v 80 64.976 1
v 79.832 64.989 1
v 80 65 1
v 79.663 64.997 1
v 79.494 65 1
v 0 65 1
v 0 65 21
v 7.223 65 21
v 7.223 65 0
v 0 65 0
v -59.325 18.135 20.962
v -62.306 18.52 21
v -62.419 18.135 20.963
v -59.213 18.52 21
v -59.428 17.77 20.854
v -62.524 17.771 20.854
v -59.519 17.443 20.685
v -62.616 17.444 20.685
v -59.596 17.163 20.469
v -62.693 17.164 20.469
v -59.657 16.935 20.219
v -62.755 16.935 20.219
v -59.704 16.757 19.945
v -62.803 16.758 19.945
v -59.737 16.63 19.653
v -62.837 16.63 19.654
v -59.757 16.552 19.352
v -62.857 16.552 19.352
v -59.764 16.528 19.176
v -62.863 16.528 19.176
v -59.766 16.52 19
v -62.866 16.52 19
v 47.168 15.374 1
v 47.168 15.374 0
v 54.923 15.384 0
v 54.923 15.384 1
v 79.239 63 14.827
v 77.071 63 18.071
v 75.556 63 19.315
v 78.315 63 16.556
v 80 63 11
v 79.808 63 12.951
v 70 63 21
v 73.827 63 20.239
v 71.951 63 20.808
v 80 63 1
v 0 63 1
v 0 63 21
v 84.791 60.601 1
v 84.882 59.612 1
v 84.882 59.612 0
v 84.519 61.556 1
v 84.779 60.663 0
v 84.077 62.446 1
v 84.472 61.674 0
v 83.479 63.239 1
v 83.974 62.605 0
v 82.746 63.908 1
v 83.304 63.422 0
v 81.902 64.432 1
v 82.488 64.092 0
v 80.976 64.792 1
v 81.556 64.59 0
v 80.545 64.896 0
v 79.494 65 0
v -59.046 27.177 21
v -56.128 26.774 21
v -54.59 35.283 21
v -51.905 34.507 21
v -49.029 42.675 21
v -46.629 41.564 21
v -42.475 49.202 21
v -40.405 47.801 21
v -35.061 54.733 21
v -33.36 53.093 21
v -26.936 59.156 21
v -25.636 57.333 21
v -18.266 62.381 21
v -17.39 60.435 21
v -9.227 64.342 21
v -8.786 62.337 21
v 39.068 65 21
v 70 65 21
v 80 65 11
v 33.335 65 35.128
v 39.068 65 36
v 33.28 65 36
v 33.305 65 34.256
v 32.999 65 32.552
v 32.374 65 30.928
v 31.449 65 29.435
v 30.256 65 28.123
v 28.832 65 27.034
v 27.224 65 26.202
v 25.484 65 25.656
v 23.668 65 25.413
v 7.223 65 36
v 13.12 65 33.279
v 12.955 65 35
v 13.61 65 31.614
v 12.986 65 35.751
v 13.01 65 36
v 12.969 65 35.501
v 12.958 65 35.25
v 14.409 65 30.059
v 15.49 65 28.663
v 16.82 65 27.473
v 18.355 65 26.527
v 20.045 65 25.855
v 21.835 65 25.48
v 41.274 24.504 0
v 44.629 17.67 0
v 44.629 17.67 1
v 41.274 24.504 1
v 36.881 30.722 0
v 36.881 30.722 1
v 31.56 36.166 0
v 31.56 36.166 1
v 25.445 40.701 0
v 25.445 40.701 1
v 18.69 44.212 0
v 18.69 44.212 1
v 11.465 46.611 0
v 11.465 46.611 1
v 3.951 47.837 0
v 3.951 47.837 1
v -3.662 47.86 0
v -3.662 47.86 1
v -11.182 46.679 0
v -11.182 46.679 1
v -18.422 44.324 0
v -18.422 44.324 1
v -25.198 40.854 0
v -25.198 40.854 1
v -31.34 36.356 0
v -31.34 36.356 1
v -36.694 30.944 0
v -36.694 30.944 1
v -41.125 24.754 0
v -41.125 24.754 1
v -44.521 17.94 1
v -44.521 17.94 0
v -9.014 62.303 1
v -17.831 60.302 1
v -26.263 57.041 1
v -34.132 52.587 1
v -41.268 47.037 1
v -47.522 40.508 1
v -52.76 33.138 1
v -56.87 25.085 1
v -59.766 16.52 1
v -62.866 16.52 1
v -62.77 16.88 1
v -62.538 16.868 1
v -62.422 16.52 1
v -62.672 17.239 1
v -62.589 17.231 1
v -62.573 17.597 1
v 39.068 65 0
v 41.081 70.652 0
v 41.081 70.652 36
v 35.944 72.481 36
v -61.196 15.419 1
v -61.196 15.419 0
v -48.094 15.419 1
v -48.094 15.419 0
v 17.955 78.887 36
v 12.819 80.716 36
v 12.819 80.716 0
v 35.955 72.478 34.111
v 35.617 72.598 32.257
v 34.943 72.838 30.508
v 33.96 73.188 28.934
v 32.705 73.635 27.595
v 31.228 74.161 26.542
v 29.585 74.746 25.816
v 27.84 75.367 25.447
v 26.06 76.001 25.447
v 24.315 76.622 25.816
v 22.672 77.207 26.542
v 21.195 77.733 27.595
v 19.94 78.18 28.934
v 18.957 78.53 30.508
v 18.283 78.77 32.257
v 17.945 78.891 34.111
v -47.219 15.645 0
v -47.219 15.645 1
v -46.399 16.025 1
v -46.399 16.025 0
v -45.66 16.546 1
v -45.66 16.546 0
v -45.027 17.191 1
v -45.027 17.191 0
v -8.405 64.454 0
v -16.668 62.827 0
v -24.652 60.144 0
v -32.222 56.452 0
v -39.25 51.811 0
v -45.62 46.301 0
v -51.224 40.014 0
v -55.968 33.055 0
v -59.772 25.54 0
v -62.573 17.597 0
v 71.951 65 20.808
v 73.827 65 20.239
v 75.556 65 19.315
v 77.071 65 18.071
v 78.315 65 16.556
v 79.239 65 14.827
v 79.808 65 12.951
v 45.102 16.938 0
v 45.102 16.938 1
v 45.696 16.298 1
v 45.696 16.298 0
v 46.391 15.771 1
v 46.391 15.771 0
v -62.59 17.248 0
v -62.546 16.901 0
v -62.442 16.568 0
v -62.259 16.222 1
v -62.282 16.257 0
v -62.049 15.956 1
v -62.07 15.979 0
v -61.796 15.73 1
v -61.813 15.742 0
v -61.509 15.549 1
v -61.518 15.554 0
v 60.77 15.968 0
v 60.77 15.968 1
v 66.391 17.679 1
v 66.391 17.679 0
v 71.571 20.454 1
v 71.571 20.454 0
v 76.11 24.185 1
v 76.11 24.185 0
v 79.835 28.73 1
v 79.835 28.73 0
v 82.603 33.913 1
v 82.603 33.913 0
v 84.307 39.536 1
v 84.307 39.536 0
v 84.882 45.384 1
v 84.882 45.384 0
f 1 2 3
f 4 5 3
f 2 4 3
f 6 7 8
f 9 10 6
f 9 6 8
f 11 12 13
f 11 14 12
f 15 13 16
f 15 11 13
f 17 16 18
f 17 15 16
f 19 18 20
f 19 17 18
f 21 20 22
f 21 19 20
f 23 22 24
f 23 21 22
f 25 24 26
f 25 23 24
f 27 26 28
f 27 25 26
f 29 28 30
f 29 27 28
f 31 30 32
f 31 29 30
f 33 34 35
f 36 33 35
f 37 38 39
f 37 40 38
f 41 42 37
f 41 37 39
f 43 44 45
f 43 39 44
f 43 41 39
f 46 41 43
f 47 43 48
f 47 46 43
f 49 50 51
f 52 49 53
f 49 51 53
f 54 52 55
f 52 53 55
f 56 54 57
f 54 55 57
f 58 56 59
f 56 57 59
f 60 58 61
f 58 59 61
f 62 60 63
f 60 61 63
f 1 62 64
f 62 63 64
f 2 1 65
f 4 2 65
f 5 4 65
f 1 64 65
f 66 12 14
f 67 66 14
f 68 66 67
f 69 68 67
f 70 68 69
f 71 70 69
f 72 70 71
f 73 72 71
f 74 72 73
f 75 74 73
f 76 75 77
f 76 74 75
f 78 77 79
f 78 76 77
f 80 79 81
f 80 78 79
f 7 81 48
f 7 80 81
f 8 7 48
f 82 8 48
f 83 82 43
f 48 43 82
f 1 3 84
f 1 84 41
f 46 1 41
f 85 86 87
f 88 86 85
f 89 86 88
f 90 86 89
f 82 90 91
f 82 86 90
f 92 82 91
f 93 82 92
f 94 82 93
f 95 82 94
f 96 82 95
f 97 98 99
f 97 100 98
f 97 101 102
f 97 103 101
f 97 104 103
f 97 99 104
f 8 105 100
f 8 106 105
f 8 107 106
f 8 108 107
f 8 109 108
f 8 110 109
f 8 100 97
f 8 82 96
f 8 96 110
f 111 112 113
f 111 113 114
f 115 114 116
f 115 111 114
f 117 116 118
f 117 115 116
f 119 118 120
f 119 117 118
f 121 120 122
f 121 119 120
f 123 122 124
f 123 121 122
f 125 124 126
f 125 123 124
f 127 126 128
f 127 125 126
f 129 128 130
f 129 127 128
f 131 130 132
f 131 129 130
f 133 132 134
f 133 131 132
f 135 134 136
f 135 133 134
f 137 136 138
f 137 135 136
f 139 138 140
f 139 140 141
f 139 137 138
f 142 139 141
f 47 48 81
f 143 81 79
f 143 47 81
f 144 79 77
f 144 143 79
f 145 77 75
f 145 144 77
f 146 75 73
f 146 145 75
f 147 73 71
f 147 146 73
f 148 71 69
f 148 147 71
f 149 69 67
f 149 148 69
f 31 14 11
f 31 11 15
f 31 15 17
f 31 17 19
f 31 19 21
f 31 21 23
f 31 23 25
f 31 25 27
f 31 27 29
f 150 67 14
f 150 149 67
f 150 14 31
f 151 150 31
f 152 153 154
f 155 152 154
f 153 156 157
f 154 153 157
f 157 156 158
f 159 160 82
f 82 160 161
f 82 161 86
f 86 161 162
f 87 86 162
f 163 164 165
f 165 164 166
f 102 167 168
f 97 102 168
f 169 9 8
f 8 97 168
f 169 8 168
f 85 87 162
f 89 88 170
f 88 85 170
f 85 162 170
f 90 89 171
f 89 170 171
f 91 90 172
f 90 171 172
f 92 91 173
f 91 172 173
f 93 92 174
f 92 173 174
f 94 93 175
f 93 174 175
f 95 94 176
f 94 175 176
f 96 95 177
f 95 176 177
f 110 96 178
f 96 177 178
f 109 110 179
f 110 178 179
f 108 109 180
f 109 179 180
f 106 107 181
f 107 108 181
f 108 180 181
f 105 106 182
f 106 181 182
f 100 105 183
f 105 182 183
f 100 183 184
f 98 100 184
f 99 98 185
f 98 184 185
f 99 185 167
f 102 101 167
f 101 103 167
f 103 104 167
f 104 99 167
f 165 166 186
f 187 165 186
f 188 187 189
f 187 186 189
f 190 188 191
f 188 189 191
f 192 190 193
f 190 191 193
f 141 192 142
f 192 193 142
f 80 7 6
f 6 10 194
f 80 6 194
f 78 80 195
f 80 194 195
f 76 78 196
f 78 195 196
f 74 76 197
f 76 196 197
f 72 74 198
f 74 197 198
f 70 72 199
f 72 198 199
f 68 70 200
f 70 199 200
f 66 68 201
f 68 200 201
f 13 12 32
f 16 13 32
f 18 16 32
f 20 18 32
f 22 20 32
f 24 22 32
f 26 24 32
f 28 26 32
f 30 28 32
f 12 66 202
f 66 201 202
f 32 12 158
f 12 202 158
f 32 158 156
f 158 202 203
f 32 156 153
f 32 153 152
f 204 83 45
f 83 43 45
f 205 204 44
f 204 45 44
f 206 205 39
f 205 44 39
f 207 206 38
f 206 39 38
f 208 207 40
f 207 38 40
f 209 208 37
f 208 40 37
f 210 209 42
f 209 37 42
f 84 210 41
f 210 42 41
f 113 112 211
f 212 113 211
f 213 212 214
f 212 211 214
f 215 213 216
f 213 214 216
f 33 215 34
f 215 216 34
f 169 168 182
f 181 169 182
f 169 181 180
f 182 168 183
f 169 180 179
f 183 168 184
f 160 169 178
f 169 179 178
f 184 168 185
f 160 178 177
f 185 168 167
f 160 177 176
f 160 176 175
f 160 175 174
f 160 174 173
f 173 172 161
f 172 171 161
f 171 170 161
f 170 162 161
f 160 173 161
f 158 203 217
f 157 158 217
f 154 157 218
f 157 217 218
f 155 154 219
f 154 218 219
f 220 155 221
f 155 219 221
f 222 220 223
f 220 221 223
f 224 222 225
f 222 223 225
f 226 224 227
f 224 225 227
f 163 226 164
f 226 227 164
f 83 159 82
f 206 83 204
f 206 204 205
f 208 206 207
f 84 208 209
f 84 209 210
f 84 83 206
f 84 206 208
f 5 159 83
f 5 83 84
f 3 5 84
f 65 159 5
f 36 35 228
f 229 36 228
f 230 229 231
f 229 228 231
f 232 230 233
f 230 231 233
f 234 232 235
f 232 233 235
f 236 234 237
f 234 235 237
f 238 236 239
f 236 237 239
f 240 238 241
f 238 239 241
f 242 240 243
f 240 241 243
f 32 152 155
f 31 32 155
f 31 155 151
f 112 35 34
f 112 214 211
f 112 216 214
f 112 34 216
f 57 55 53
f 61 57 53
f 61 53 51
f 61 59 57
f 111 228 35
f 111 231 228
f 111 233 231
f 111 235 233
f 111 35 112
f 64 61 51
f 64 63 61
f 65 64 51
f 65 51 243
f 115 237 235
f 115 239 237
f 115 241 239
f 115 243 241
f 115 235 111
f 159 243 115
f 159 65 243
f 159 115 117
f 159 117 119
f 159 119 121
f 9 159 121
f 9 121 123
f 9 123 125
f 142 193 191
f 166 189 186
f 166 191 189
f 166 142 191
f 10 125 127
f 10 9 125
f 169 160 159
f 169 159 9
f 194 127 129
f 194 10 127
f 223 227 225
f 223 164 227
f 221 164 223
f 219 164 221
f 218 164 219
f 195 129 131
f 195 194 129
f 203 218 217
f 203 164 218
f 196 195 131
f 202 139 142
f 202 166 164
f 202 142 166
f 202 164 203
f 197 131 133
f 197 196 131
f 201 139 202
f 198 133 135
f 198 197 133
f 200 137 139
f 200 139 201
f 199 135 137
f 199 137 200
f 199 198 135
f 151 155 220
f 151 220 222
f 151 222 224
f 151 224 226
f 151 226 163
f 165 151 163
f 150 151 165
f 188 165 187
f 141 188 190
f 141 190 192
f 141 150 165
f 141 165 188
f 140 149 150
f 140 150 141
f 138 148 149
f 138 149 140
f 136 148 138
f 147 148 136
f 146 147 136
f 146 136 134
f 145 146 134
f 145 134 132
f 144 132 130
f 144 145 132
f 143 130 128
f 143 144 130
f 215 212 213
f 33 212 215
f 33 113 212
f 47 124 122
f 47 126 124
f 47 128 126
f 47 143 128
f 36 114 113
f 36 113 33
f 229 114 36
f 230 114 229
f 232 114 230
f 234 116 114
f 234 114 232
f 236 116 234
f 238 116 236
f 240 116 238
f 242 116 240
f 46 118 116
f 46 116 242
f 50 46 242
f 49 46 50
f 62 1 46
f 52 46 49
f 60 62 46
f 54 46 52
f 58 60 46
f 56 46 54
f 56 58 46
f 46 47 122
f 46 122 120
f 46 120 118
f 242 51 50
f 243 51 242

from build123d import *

# Parameters (mm, degrees)
PAD_DEPTH         = 1
PAD004_DEPTH      = 20
FILLET_R          = 10
FILLET001_R       = 2
PAD005_DEPTH      = 35
PAD005_DEPTH_BACK = 1
SKETCH005_R       = 9.6
POCKET_DEPTH      = 86.945705044


with BuildPart() as part:
    # Sketch → Pad (new body)
    with BuildSketch(Plane.XY):
        with BuildLine():
            ThreePointArc((2.407e-07, 65), (-39.2503215588, 51.8113139915), (-62.5726380514, 17.5973))
            ThreePointArc((-62.5726380514, 17.5973), (-62.2816568518, 16.2569186959), (-61.1956, 15.4192))
            Line((-61.1956, 15.4192), (-48.0942, 15.4192))
            ThreePointArc((-48.0942, 15.4192), (-46.0175682638, 16.2684180018), (-44.5213344809, 17.9402))
            ThreePointArc((44.6290648541, 17.6705), (0.1452101265, 47.9997803539), (-44.5213344809, 17.9402))
            ThreePointArc((44.6290648541, 17.6705), (45.6957884662, 16.2979684833), (47.1679586113, 15.3736))
            Line((47.1679586113, 15.3736), (54.9232114248, 15.3841578001))
            ThreePointArc((54.9232114248, 15.3841578001), (76.1100083043, 24.1853710213), (84.8823702407, 45.38413))
            Line((84.8823702407, 59.61183), (84.8823702407, 45.38413))
            ThreePointArc((84.8823702407, 59.61183), (83.3042117859, 63.4218415452), (79.4942002407, 65))
            Line((2.407e-07, 65), (79.4942002407, 65))
        make_face()
    extrude(amount=PAD_DEPTH)

    # Sketch001 → Pad004 (new body)
    with BuildSketch(Plane.XY.offset(1)):
        with BuildLine():
            ThreePointArc((6.04881e-05, 65), (-39.6936405321, 51.4724674103), (-62.8655421025, 16.5204))
            Line((-62.8655421025, 16.5204), (-59.7655421025, 16.5204))
            ThreePointArc((6.04881e-05, 63), (-37.8013201978, 49.9422727575), (-59.7655421025, 16.5204))
            Line((80.0000604881, 63), (6.04881e-05, 63))
            Line((80.0000604881, 65), (80.0000604881, 63))
            Line((6.04881e-05, 65), (80.0000604881, 65))
        make_face()
    extrude(amount=PAD004_DEPTH)

    # Fillet
    fillet_edges = [part.edges().sort_by_distance(p)[0] for p in [
        (80.00006, 64, 21),
    ]]
    fillet(fillet_edges, radius=FILLET_R)

    # Fillet001
    fillet001_edges = [part.edges().sort_by_distance(p)[0] for p in [
        (-61.315542, 16.5204, 21),
    ]]
    fillet(fillet001_edges, radius=FILLET001_R)

    # Sketch004 → Pad005 (new body, two sides)
    with BuildSketch(Plane.XY.offset(1)) as pad005_sk:
        Polygon((12.8190404688, 80.7158918092), (41.0807640524, 70.6523447167), (39.0680546339, 65), (7.2228631212, 65), align=None)
    extrude(amount=PAD005_DEPTH)
    extrude(pad005_sk.sketch, amount=-PAD005_DEPTH_BACK)

    # Sketch005 → Pocket (cut, through all)
    with BuildSketch(Plane(origin=(26.9499022606, 75.6841182629, 0), x_dir=(-0.9420574528, 0.3354515698, 0), z_dir=(0.3354515698, 0.9420574528, 0))):
        with Locations((0, 35)):
            Circle(SKETCH005_R)
    extrude(amount=-POCKET_DEPTH, mode=Mode.SUBTRACT)


solid = part.part
